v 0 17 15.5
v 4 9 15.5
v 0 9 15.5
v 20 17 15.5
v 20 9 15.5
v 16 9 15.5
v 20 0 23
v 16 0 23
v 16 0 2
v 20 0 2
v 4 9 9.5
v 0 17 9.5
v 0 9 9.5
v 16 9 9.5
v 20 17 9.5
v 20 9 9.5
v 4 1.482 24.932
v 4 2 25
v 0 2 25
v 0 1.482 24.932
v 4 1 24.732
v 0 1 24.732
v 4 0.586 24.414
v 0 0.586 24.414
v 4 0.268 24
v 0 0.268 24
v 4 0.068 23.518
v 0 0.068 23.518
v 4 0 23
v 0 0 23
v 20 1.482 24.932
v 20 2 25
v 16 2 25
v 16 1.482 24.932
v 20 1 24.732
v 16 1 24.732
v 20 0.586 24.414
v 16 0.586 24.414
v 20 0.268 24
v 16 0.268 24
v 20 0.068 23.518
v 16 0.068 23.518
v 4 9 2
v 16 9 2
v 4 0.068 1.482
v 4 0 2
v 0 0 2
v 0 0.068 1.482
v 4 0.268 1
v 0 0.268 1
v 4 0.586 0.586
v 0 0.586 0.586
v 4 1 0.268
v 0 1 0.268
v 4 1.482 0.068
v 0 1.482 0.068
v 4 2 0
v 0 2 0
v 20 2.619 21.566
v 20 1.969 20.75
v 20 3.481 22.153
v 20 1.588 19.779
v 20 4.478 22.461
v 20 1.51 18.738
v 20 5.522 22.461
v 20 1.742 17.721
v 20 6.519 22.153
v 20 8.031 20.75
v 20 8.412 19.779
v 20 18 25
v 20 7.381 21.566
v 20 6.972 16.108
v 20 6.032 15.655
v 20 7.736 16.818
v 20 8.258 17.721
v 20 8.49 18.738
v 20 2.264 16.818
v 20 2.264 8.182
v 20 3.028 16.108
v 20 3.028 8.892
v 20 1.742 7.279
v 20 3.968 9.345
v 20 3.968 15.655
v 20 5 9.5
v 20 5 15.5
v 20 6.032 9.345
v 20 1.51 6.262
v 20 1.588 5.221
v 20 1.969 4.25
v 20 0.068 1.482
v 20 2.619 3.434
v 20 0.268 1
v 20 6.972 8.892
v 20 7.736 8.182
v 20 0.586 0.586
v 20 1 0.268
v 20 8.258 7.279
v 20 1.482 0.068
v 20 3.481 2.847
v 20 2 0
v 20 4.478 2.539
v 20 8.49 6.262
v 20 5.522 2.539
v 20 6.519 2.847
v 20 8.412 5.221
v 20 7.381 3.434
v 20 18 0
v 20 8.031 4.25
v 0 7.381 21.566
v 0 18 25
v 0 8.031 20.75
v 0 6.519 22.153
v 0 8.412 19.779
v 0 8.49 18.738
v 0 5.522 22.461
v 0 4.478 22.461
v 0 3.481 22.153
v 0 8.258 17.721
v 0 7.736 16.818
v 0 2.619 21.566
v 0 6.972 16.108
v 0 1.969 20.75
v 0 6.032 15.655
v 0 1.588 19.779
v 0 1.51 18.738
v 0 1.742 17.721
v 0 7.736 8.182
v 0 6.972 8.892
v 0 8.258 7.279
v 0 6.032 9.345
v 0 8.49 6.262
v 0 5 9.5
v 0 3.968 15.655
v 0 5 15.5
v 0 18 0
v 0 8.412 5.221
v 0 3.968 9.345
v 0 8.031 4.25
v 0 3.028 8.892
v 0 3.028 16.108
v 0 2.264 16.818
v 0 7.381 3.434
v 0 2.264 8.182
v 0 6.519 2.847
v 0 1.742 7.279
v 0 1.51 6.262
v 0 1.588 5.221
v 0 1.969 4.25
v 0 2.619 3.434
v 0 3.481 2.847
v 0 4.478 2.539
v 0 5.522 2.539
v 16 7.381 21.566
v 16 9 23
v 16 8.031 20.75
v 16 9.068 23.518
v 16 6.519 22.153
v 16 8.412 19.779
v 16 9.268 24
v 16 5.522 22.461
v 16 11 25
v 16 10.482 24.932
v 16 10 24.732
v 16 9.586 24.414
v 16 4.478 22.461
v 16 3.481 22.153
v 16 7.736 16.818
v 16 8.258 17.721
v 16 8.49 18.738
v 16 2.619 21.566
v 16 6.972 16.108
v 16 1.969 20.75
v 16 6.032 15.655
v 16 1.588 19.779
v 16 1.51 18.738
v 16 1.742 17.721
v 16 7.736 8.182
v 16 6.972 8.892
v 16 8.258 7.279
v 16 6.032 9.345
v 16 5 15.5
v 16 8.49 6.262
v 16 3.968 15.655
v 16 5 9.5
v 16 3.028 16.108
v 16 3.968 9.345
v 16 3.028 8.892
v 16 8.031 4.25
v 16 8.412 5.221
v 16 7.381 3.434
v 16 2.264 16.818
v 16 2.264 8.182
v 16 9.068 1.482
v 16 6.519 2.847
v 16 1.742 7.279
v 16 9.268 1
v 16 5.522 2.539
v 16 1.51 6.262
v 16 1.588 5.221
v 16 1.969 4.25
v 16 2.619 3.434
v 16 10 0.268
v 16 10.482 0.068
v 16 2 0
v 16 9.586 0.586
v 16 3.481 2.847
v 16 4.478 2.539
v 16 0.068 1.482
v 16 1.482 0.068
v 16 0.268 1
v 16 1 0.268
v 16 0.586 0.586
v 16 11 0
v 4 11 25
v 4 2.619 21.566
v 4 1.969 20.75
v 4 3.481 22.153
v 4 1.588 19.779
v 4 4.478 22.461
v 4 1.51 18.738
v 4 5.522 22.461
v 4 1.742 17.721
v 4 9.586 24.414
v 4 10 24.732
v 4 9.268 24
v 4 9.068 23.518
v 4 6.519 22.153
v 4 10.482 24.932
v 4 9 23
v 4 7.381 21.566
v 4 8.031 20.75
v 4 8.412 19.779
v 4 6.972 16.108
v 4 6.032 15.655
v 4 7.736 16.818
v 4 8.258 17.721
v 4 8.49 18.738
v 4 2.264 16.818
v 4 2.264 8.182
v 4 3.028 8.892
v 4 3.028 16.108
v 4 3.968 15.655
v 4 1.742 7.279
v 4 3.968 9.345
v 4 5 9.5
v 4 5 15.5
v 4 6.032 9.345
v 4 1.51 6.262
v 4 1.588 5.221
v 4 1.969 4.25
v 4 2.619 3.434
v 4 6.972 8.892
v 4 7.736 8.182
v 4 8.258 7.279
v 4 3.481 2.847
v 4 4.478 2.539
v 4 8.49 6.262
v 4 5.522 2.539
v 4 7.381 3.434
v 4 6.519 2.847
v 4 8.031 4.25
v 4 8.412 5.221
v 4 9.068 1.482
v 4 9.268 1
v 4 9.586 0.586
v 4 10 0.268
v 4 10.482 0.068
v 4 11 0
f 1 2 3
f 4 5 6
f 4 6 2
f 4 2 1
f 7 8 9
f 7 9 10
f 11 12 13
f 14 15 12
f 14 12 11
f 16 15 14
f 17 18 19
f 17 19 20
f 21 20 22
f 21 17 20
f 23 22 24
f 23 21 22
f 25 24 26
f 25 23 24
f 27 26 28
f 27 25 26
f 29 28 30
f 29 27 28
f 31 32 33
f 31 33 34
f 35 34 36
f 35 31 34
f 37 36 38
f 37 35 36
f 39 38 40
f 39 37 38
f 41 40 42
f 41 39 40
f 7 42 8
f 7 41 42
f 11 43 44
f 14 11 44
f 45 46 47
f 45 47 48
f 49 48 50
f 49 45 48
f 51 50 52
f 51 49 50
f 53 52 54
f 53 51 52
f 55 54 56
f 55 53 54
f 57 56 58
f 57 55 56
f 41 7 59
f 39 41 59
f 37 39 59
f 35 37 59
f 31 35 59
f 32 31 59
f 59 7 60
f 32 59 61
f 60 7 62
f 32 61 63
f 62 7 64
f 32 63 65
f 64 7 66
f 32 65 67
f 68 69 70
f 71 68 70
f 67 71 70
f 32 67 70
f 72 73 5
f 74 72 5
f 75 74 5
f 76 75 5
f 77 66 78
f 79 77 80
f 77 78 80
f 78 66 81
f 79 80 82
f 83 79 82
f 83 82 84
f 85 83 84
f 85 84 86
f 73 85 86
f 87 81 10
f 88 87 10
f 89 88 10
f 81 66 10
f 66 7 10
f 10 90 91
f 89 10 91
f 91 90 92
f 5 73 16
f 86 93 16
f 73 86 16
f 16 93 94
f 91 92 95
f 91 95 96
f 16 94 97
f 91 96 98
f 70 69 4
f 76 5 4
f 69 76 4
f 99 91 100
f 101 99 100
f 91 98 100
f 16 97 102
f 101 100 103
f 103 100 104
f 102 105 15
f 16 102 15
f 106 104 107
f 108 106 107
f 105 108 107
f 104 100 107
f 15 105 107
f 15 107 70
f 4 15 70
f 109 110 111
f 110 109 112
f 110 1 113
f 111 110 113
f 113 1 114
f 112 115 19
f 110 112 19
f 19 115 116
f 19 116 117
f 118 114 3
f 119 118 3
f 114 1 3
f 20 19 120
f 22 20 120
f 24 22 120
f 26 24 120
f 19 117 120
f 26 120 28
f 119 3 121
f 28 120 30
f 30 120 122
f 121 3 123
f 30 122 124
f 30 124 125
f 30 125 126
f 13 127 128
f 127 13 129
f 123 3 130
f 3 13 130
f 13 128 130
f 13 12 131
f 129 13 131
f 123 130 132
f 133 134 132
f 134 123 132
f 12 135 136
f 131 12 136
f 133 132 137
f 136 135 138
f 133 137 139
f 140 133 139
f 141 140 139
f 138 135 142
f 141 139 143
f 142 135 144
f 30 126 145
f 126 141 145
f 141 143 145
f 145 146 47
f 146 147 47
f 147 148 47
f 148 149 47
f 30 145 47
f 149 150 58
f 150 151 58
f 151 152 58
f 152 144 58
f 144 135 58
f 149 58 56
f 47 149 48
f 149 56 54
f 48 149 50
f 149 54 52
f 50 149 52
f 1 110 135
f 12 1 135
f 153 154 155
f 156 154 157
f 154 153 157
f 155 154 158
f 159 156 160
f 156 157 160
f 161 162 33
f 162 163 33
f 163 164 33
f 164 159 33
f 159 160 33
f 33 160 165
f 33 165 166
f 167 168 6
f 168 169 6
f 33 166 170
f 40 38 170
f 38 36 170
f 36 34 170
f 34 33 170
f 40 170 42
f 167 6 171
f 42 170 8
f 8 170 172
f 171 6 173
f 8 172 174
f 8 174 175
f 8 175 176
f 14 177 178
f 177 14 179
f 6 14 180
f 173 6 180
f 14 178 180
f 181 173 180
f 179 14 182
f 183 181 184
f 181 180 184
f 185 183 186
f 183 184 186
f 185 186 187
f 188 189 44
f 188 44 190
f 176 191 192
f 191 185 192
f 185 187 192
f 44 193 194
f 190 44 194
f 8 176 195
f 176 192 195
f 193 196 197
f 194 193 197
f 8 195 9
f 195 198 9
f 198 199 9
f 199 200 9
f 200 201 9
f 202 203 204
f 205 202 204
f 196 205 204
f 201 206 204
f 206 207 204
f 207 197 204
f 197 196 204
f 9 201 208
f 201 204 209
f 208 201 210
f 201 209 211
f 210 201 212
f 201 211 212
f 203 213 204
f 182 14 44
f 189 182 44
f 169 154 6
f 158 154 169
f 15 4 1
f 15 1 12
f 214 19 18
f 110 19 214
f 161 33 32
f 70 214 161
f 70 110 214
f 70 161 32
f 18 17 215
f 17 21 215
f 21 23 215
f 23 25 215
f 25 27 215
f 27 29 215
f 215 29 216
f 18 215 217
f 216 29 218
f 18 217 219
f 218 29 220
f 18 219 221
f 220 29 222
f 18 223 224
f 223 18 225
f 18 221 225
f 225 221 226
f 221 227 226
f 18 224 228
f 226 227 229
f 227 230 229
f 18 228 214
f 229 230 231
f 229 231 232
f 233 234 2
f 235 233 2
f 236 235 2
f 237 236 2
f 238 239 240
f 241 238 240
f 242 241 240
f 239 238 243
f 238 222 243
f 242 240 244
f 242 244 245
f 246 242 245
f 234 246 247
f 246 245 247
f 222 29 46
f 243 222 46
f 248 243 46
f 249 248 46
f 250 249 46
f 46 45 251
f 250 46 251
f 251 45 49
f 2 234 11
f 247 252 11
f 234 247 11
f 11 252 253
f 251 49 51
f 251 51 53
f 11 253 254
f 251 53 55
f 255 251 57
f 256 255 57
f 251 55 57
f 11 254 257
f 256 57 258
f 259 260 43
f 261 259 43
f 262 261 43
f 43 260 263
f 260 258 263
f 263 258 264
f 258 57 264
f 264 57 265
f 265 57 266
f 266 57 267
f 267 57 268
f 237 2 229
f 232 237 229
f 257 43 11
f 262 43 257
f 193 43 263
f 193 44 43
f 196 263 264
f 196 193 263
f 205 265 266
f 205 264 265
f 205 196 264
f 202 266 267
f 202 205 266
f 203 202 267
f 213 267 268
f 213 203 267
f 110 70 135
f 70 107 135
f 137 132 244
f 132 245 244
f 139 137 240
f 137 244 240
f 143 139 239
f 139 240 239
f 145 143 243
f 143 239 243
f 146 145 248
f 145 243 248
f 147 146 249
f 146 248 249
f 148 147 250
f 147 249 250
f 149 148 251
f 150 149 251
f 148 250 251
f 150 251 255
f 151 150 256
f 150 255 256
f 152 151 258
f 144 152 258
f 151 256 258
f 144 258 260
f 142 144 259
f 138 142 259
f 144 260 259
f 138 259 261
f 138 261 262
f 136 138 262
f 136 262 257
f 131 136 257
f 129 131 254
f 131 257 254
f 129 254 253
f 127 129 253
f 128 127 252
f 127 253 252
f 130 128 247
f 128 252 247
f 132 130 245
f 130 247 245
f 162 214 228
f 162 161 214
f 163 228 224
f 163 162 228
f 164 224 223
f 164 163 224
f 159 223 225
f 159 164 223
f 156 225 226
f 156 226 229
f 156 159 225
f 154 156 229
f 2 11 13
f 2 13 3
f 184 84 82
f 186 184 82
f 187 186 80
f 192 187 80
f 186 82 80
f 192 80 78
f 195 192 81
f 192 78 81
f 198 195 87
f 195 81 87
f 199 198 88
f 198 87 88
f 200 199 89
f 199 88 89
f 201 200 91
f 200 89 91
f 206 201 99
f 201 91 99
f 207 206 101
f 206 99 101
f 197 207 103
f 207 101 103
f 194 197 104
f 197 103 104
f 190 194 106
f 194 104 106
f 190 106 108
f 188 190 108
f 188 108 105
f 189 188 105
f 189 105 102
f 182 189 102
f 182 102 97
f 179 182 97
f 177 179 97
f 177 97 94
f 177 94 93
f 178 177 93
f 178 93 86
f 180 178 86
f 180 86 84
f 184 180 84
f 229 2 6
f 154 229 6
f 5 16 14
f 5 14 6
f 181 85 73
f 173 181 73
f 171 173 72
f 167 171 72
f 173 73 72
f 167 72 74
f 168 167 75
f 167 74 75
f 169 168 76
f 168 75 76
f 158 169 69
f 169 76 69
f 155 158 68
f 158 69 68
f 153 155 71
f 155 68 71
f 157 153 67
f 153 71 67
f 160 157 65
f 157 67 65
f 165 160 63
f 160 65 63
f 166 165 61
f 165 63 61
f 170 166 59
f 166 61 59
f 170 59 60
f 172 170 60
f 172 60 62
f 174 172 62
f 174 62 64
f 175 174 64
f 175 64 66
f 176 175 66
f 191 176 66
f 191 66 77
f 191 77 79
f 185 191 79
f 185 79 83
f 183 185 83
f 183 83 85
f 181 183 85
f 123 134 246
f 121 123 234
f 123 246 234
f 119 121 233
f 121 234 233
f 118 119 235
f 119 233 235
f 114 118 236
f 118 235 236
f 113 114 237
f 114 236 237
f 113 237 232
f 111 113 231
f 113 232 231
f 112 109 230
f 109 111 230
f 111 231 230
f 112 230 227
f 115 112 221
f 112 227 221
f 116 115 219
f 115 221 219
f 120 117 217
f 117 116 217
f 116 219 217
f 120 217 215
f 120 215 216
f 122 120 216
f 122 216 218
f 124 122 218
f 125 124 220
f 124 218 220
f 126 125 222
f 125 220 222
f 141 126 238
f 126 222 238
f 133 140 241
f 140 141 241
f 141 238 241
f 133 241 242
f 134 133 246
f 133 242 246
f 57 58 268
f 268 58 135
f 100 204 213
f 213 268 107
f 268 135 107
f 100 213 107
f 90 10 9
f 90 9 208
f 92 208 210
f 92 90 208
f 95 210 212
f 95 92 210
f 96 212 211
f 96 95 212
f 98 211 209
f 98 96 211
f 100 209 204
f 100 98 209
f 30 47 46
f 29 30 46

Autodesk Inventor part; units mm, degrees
ref_plane "YZ Plane" through (0, 0, 0) normal (1, 0, 0) x (0, 1, 0)
ref_plane "XZ Plane" through (0, 0, 0) normal (0, 1, 0) x (-1, 0, 0)
sketch "Sketch1" plane through (0, 0, 0) normal (0, 0, 1) x (1, 0, 0)
  line L0 (20, 0) -> (20, 18)
  line L1 (20, 18) -> (0, 18)
  line L2 (0, 18) -> (0, 0)
  line L3 (0, 0) -> (4, 0)
  line L4 (4, 0) -> (4, 9)
  line L5 (4, 9) -> (16, 9)
  line L6 (16, 9) -> (16, 0)
  line L7 (16, 0) -> (20, 0)
  point P0 (10, 9)
  point P1 (10, 18)
  dimension "d0" = 18
  dimension "d1" = 20
  dimension "d2" = 9
  dimension "d28" = 12
  dimension "d29" = 4
  dimension "d30" = 4
extrude "Extrusion1" add sketch "Sketch1" along normal blind 25
sketch "Sketch2" plane through (0, 0, 0) normal (-1, 0, 0) x (0, 0, 1)
  line L0 (0, 0) -> (25, 0) projected
  line L1 (0, 0) -> (0, 18) projected
  point P0 (6, 5)
  dimension "d10" = 5
  dimension "d11" = 6
hole "Hole1" at (0, 5, 6) direction (1, 0, 0) diameter 7 end through all
ref_plane "Work Plane1" through (0, 0, 12.5) normal (0, 0, 1) x (1, 0, 0)
mirror "Mirror1" about plane through (0, 0, 12.5) normal (0, 0, 1) of "Hole1"
fillet "Fillet1" radius 2 6 edges at (10, 9, 0) (2, 0, 0) (18, 0, 0) (2, 0, 25) (18, 0, 25) (10, 9, 25)
sketch "Sketch3" plane through (20, 18, 25) normal (1, 0, 0) x (0, 0, -1)
  line L0 (9.5, -1) -> (15.5, -1)
  line L1 (15.5, -1) -> (15.5, -9)
  line L2 (15.5, -9) -> (9.5, -9)
  line L3 (9.5, -9) -> (9.5, -1)
  line L4 (25, 0) -> (0, 0) projected
  line L5 (0, -16) -> (0, 0) projected
  point P0 (25, -18)
  dimension "d21" = 6
  dimension "d22" = 8
  dimension "d24" = 9
  dimension "d25" = 9.5
extrude "Extrusion2" cut sketch "Sketch3" against normal blind 20
properties part number "Salida"
